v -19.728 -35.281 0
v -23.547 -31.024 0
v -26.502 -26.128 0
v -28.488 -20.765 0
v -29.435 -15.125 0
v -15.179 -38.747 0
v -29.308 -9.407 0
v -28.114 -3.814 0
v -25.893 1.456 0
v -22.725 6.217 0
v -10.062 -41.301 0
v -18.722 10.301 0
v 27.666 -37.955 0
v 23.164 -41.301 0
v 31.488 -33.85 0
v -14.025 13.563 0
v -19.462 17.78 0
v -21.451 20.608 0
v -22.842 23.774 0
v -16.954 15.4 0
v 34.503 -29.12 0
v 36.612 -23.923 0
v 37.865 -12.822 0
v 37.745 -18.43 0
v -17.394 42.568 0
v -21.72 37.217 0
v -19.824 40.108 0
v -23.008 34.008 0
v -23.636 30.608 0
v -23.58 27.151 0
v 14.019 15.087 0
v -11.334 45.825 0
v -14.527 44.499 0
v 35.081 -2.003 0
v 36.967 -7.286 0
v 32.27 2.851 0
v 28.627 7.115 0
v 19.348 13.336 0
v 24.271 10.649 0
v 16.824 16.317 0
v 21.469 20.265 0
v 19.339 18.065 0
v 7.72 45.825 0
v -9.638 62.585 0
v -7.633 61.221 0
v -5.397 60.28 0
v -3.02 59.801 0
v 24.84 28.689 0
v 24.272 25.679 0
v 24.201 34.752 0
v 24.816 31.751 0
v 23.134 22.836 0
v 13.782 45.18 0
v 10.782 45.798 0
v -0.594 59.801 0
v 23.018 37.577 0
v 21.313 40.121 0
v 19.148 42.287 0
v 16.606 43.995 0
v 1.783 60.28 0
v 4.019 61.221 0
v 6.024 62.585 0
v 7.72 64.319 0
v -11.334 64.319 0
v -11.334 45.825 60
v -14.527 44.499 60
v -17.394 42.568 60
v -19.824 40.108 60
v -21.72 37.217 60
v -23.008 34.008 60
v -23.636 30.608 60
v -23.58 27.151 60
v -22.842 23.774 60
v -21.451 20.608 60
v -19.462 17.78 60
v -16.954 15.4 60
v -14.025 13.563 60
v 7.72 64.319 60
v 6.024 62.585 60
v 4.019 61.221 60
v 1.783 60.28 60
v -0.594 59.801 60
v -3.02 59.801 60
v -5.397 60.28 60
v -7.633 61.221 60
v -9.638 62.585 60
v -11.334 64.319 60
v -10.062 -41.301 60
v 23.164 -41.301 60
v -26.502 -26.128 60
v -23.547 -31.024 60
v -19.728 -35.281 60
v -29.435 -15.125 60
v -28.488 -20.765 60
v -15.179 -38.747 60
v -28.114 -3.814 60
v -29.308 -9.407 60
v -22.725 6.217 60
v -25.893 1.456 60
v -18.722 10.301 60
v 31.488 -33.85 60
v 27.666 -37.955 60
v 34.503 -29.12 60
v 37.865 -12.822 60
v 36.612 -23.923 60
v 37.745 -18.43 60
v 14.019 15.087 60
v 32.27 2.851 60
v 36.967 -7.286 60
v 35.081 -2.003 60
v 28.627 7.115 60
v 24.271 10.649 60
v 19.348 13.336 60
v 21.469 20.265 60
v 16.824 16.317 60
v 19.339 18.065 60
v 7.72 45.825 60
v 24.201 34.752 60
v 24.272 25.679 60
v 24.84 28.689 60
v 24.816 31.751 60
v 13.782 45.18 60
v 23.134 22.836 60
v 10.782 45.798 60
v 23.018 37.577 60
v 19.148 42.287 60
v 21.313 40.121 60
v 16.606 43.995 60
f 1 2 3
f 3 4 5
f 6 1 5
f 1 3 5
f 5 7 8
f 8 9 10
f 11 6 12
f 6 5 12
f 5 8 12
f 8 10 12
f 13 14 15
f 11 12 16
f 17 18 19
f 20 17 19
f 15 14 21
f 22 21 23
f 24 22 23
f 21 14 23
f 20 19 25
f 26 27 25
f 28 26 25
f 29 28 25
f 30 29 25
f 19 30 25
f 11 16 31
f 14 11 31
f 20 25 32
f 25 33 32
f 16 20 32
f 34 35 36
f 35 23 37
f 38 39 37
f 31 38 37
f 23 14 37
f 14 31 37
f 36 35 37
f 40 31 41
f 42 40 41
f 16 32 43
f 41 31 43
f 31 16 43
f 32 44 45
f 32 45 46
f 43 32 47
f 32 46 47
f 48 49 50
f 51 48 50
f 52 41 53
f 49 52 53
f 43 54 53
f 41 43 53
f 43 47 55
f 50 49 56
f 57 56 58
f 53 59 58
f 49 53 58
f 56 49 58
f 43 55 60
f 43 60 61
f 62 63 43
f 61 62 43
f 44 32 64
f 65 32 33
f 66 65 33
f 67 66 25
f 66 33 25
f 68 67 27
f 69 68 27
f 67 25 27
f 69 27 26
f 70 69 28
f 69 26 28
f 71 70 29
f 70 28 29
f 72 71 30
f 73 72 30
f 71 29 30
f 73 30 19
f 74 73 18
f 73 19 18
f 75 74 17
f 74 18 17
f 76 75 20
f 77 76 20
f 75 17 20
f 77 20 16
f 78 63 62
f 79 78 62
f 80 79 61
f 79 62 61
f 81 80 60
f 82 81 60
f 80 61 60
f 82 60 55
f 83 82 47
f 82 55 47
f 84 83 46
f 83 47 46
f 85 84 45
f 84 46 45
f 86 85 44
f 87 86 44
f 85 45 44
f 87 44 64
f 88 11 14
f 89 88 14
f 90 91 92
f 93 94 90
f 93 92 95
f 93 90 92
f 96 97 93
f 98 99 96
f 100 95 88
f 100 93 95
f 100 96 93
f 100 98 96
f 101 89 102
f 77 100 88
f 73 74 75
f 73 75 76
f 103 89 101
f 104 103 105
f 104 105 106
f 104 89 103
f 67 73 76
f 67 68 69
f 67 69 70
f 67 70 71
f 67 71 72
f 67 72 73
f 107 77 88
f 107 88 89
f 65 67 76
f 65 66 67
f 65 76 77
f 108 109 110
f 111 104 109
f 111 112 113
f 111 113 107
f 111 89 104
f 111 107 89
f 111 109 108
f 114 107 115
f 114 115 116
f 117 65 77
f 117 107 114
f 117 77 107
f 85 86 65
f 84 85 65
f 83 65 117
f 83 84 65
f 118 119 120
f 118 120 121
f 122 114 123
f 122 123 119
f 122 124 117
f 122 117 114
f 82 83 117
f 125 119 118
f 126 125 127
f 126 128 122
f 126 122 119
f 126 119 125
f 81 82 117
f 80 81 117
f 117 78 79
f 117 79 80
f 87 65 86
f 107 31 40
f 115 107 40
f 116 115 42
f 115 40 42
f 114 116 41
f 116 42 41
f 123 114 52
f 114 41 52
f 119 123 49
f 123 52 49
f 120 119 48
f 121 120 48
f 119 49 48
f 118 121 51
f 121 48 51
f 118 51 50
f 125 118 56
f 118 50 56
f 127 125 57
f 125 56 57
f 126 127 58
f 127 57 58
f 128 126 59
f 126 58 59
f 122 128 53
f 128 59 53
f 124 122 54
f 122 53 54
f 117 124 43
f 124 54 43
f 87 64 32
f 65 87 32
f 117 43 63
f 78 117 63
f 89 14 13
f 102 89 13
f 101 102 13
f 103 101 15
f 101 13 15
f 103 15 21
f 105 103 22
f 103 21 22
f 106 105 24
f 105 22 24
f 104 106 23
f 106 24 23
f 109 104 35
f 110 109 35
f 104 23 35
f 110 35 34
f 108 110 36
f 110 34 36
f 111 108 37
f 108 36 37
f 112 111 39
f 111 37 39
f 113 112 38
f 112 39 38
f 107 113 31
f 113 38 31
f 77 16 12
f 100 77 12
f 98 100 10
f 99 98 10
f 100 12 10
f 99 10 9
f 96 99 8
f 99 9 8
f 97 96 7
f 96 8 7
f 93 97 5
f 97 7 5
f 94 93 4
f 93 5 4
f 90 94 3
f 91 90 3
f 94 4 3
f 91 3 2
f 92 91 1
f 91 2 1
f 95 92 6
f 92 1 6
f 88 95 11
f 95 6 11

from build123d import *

# Parameters (mm, degrees)
F1_DEPTH = 60


with BuildPart() as f1:
    # F0 (on Top) → F1 (new body)
    with BuildSketch(Plane.XY):
        with BuildLine():
            Line((0, -41.300625), (23.163913, -41.300625))
            ThreePointArc((23.163913, -41.300625), (37.541736, -10.033364), (14.019156, 15.087376))
            ThreePointArc((14.019156, 15.087376), (24.581036, 33.266488), (7.719544, 45.825291))
            Line((7.719544, 45.825291), (7.719544, 64.319231))
            ThreePointArc((7.719544, 64.319231), (-1.807018, 59.74027), (-11.333581, 64.319231))
            Line((-11.333581, 64.319231), (-11.333581, 45.825291))
            ThreePointArc((-11.333581, 45.825291), (-23.6358, 30.608301), (-14.024769, 13.563377))
            ThreePointArc((-14.024769, 13.563377), (-29.434517, -15.124752), (-10.062043, -41.300625))
            Line((-10.062043, -41.300625), (0, -41.300625))
        make_face()
    extrude(amount=F1_DEPTH)


solid = f1.part
